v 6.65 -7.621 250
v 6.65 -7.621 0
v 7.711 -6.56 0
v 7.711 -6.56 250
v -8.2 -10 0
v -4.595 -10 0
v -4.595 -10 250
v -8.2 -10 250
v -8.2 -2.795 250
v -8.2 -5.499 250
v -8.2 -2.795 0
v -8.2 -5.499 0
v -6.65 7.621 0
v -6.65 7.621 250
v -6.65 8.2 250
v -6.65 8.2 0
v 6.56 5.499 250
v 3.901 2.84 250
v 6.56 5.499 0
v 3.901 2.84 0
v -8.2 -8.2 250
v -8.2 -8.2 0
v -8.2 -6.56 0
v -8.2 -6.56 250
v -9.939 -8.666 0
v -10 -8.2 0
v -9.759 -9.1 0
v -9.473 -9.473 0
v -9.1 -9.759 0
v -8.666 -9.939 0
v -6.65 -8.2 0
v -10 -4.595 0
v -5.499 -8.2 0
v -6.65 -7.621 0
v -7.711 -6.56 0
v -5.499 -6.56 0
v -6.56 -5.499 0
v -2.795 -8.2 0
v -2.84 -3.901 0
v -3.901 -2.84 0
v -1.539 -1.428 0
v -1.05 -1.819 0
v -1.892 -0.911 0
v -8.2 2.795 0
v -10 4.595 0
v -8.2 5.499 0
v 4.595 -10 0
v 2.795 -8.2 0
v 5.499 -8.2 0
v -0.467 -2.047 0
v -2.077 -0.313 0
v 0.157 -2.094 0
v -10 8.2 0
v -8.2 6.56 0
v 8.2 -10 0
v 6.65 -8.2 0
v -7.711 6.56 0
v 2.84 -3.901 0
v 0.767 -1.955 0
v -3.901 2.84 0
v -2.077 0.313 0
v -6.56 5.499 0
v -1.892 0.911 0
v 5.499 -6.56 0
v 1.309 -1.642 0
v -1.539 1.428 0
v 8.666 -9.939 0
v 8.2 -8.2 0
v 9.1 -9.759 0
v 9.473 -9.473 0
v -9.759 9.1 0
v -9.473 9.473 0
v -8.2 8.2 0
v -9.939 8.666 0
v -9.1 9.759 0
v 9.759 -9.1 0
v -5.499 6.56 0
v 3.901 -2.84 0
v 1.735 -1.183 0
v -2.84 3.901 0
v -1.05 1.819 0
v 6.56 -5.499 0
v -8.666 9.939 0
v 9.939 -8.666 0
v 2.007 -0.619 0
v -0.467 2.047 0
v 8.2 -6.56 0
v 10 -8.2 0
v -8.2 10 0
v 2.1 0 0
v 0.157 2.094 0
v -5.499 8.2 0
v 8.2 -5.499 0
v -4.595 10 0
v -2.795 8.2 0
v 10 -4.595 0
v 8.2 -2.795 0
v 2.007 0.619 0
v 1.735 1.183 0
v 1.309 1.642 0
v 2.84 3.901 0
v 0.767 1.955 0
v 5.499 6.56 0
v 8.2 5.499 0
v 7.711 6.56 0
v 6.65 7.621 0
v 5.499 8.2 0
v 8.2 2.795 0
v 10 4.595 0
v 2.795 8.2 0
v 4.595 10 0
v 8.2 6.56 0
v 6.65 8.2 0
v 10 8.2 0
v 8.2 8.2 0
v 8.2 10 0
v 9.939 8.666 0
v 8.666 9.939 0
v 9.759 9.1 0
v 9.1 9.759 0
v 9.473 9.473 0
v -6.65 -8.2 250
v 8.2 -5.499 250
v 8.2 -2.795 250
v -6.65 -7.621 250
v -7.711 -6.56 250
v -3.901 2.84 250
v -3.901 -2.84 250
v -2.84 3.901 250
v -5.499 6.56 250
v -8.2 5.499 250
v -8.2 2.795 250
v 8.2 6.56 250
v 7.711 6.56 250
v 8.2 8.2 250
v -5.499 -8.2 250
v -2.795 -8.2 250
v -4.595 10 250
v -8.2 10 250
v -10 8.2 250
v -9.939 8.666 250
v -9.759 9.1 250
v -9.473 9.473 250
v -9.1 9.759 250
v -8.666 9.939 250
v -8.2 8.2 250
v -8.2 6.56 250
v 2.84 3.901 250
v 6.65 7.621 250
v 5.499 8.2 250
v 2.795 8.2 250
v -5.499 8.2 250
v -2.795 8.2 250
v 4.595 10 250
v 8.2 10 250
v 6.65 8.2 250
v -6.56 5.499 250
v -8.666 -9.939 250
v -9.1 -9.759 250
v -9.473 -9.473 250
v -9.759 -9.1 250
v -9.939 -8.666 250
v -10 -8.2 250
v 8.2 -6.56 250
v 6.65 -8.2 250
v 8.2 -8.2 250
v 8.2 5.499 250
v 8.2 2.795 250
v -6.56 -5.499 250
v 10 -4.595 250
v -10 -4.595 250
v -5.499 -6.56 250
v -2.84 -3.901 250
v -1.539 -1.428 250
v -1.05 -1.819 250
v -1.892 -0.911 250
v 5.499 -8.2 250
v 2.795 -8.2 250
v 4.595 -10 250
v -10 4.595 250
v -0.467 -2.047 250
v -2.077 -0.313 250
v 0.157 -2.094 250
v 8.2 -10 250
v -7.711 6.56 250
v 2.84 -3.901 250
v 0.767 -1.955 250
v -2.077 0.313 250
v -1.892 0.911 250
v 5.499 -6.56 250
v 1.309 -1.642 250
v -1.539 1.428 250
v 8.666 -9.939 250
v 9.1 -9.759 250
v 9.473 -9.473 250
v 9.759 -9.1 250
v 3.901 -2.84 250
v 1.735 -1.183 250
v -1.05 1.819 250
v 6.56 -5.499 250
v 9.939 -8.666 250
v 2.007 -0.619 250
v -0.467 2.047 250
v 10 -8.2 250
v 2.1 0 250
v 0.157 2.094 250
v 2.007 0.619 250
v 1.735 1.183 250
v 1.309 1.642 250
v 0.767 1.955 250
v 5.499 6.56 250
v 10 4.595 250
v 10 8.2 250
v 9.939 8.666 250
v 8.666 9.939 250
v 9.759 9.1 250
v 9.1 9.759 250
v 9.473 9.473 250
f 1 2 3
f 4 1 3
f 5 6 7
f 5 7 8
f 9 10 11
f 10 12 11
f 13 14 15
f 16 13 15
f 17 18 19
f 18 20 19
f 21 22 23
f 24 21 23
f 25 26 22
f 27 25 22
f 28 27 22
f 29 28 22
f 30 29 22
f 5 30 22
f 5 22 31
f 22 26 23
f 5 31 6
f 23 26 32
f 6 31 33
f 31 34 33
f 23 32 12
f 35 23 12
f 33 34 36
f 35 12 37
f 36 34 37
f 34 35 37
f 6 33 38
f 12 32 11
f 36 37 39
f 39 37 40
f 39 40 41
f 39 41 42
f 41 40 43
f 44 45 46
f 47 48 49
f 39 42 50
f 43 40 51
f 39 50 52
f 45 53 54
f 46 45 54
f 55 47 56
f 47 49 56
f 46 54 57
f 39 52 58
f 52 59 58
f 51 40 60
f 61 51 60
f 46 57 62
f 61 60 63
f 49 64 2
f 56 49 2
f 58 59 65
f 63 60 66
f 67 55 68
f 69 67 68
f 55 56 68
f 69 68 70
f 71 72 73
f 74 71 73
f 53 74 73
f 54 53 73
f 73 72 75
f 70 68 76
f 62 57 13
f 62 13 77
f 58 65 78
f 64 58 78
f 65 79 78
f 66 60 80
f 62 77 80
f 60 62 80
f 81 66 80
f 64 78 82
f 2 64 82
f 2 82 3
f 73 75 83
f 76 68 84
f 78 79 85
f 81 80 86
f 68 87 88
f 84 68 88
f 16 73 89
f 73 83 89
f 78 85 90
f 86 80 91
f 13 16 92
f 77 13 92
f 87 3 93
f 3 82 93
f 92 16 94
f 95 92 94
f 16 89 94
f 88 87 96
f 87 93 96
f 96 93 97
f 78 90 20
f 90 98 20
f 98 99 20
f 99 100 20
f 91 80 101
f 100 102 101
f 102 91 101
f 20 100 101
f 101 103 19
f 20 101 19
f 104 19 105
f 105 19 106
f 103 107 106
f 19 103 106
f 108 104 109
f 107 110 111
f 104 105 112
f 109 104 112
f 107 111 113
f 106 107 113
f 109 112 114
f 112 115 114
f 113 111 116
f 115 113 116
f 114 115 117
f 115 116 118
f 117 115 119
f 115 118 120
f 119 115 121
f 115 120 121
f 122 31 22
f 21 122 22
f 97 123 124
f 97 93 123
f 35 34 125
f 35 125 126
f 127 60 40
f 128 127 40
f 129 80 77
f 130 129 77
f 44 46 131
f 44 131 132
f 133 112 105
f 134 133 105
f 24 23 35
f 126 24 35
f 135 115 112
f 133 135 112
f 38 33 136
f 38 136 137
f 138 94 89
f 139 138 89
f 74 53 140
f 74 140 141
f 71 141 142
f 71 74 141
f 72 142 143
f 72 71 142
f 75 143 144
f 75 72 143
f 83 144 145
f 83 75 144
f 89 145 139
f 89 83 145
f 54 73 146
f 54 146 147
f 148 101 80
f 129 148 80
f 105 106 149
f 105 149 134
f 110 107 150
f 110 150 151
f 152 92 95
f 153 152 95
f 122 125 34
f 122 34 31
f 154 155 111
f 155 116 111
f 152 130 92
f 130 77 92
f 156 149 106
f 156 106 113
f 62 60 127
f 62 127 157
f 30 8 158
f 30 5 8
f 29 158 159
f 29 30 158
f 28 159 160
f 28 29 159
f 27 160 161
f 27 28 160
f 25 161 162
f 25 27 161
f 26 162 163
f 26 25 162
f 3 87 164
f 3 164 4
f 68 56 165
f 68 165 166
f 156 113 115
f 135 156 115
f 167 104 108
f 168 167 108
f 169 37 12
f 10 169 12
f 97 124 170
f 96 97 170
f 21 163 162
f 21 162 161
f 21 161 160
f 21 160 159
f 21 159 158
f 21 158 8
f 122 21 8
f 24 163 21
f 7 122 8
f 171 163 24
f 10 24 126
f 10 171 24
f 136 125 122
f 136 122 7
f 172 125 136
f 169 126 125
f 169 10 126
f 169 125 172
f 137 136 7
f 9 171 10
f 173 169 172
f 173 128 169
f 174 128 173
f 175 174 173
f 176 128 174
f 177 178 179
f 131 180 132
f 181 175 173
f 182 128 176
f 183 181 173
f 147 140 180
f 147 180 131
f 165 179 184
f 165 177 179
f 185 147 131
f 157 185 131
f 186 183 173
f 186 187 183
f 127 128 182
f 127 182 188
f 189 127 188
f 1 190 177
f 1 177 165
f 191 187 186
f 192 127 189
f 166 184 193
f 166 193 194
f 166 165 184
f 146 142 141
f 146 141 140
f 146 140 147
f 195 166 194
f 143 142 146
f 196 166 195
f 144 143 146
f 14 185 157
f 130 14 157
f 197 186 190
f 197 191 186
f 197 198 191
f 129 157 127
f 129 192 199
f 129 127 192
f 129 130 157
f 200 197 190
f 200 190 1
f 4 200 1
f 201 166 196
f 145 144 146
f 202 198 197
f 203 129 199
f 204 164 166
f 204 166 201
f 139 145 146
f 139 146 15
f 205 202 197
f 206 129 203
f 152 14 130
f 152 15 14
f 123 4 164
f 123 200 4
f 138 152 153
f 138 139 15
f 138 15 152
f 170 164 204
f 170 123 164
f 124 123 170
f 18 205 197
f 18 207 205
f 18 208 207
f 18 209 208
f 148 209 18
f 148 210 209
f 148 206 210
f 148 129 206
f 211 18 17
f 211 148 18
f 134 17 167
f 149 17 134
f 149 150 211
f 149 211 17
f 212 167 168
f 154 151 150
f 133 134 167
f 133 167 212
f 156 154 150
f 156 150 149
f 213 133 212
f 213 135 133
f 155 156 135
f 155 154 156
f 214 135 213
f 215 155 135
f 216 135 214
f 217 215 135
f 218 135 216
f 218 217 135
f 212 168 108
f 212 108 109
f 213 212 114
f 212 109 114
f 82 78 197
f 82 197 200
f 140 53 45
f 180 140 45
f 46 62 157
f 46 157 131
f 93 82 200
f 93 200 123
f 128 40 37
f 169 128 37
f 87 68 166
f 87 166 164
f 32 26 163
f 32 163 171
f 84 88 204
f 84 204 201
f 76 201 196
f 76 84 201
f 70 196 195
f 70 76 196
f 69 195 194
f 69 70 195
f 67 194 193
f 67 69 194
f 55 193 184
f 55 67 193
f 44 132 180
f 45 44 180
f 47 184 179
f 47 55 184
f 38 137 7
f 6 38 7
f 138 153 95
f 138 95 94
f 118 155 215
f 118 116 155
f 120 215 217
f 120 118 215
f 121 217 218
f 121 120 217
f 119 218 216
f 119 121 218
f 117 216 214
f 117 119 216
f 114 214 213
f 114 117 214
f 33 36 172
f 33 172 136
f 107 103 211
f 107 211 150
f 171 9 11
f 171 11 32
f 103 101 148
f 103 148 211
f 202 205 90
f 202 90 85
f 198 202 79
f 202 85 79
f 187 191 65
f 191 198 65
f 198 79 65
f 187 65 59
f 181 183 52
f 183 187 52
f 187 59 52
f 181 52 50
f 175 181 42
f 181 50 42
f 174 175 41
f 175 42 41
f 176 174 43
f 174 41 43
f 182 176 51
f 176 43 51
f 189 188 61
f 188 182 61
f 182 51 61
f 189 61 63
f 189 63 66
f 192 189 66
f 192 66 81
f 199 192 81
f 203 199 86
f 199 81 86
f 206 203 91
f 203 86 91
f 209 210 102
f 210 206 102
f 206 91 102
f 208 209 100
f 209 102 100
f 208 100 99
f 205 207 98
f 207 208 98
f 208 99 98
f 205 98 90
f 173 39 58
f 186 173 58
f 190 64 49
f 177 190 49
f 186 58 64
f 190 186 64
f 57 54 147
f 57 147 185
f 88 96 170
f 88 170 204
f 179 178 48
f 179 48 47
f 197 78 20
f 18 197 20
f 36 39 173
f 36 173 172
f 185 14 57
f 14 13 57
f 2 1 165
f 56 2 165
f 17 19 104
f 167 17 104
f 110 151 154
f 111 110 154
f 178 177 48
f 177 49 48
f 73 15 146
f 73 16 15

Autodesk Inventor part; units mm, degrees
ref_plane "YZ Plane" through (0, 0, 0) normal (1, 0, 0) x (0, 1, 0)
sketch "Sketch1" plane through (0, 0, 0) normal (0, 0, 1) x (1, 0, 0)
  line L0 (10, -4.5951) -> (10, -8.2)
  line L1 (-10, -8.2) -> (-10, -4.5951)
  line L2 (-10, 10) -> (10, -10) construction
  line L3 (10, 10) -> (-10, -10) construction
  circle A0 centre (0, 0) radius 2.1
  line L4 (-2.84, -3.9007) -> (2.84, -3.9007)
  line L5 (3.9007, -2.84) -> (3.9007, 2.84)
  line L6 (2.84, 3.9007) -> (-2.84, 3.9007)
  line L7 (-3.9007, 2.84) -> (-3.9007, -2.84)
  line L8 (-3.9007, -3.9007) -> (3.9007, 3.9007) construction
  line L9 (3.9007, -3.9007) -> (-3.9007, 3.9007) construction
  line L10 (-3.9007, -2.84) -> (-2.84, -3.9007) construction
  line L11 (-2.84, -3.9007) -> (-5.4993, -6.56)
  line L12 (-5.4993, -6.56) -> (-5.4993, -8.2)
  line L13 (-5.4993, -8.2) -> (-2.7951, -8.2)
  line L14 (-2.7951, -8.2) -> (-4.5951, -10)
  line L15 (0, 0) -> (0, -3.9007) construction
  line L16 (3.9007, -2.84) -> (2.84, -3.9007) construction
  line L17 (2.84, -3.9007) -> (5.4993, -6.56)
  line L18 (5.4993, -6.56) -> (5.4993, -8.2)
  line L19 (5.4993, -8.2) -> (2.7951, -8.2)
  line L20 (2.7951, -8.2) -> (4.5951, -10)
  line L21 (-2.84, -3.9007) -> (-3.9007, -2.84) construction
  line L22 (-3.9007, -2.84) -> (-6.56, -5.4993)
  line L23 (-6.56, -5.4993) -> (-8.2, -5.4993)
  line L24 (-8.2, -5.4993) -> (-8.2, -2.7951)
  line L25 (-8.2, -2.7951) -> (-10, -4.5951)
  line L26 (3.9007, -2.84) -> (6.56, -5.4993)
  line L27 (6.56, -5.4993) -> (8.2, -5.4993)
  line L28 (8.2, -5.4993) -> (8.2, -2.7951)
  line L29 (8.2, -2.7951) -> (10, -4.5951)
  arc A1 (-10, -8.2) -> (-8.2, -10) centre (-8.2, -8.2) ccw
  arc A2 (8.2, -10) -> (10, -8.2) centre (8.2, -8.2) ccw
  line L30 (-8.2, -6.56) -> (-7.7111, -6.56)
  line L31 (-6.6505, -8.2) -> (-8.2, -8.2)
  line L32 (-8.2, -8.2) -> (-8.2, -6.56)
  line L33 (-6.6505, -7.6207) -> (-7.7111, -6.56)
  line L34 (-6.6505, -7.6207) -> (-6.6505, -8.2)
  line L35 (8.2, -6.56) -> (7.7111, -6.56)
  line L36 (6.6505, -8.2) -> (8.2, -8.2)
  line L37 (8.2, -8.2) -> (8.2, -6.56)
  line L38 (6.6505, -7.6207) -> (7.7111, -6.56)
  line L39 (6.6505, -7.6207) -> (6.6505, -8.2)
  line L40 (8.2, -10) -> (4.5951, -10)
  line L41 (-4.5951, -10) -> (-8.2, -10)
  line L42 (-3.9007, 0) -> (3.9007, 0) construction
  line L43 (10, 4.5951) -> (10, 8.2)
  line L44 (-10, 8.2) -> (-10, 4.5951)
  line L45 (-2.84, 3.9007) -> (2.84, 3.9007)
  line L46 (-3.9007, 2.84) -> (-2.84, 3.9007) construction
  line L47 (-2.84, 3.9007) -> (-5.4993, 6.56)
  line L48 (-5.4993, 6.56) -> (-5.4993, 8.2)
  line L49 (-5.4993, 8.2) -> (-2.7951, 8.2)
  line L50 (-2.7951, 8.2) -> (-4.5951, 10)
  line L51 (2.84, 3.9007) -> (5.4993, 6.56)
  line L52 (5.4993, 6.56) -> (5.4993, 8.2)
  line L53 (5.4993, 8.2) -> (2.7951, 8.2)
  line L54 (2.7951, 8.2) -> (4.5951, 10)
  line L55 (3.9007, 2.84) -> (2.84, 3.9007) construction
  line L56 (-8.2, 2.7951) -> (-10, 4.5951)
  line L57 (-2.84, 3.9007) -> (-3.9007, 2.84) construction
  line L58 (-3.9007, 2.84) -> (-6.56, 5.4993)
  line L59 (-6.56, 5.4993) -> (-8.2, 5.4993)
  line L60 (-8.2, 5.4993) -> (-8.2, 2.7951)
  line L61 (3.9007, 2.84) -> (6.56, 5.4993)
  line L62 (6.56, 5.4993) -> (8.2, 5.4993)
  line L63 (8.2, 5.4993) -> (8.2, 2.7951)
  line L64 (8.2, 2.7951) -> (10, 4.5951)
  arc A3 (-8.2, 10) -> (-10, 8.2) centre (-8.2, 8.2) ccw
  arc A4 (10, 8.2) -> (8.2, 10) centre (8.2, 8.2) ccw
  line L65 (-8.2, 6.56) -> (-7.7111, 6.56)
  line L66 (-6.6505, 8.2) -> (-8.2, 8.2)
  line L67 (-8.2, 8.2) -> (-8.2, 6.56)
  line L68 (-6.6505, 7.6207) -> (-7.7111, 6.56)
  line L69 (-6.6505, 7.6207) -> (-6.6505, 8.2)
  line L70 (8.2, 6.56) -> (7.7111, 6.56)
  line L71 (6.6505, 7.6207) -> (7.7111, 6.56)
  line L72 (8.2, 8.2) -> (8.2, 6.56)
  line L73 (6.6505, 7.6207) -> (6.6505, 8.2)
  line L74 (6.6505, 8.2) -> (8.2, 8.2)
  line L75 (8.2, 10) -> (4.5951, 10)
  line L76 (-4.5951, 10) -> (-8.2, 10)
  line L77 (-8.2, 10) -> (-4.5951, 10)
  line L78 (4.5951, 10) -> (8.2, 10)
  point P0 (8.2, -8.2)
  point P1 (0, 3.9007)
  point P2 (8.2, 8.2)
  point P3 (0, 2.1)
  point P4 (1.4849, 1.4849)
  point P5 (0, 2.1)
  point P6 (0, 10)
  dimension "Width" = 20
  dimension "Height" = 20
  dimension "d2" = 4.2
  dimension "d3" = 1.5
  dimension "d4" = 1.64
  dimension "d6" = 5.68
  dimension "d7" = 1.8
  dimension "d9" = 1.5
ref_plane "Start Plane" through (0, 0, 0) normal (0, 0, 1) x (1, 0, 0)
ref_plane "End Plane" through (0, 0, 20) normal (0, 0, 1) x (1, 0, 0)
sketch "Sketch4" plane through (0, 0, 0) normal (0, 0, 1) x (1, 0, 0)
  line L0 (0, 0) -> (10, 0)
ref_plane "Work Plane4" through (0, 0, 0) normal (0, -1, 0) x (1, 0, 0)
sketch "Sketch5" plane through (0, 0, 0) normal (0, -1, 0) x (1, 0, 0)
  line L0 (-2, 0) -> (12, 0) construction
  line L1 (-2, 20) -> (12, 20) construction
  dimension "d17" = 20
extrude "Extrusion3" add sketch "Sketch1" along normal blind 250
equation "\"G_OFFSET_START\" = 0"
equation "\"G_OFFSET_END\" = 0"
equation "\"G_L\" = d17"
properties part number "V-slot 20 mm x 20 mm" material "Aluminum 6061"
